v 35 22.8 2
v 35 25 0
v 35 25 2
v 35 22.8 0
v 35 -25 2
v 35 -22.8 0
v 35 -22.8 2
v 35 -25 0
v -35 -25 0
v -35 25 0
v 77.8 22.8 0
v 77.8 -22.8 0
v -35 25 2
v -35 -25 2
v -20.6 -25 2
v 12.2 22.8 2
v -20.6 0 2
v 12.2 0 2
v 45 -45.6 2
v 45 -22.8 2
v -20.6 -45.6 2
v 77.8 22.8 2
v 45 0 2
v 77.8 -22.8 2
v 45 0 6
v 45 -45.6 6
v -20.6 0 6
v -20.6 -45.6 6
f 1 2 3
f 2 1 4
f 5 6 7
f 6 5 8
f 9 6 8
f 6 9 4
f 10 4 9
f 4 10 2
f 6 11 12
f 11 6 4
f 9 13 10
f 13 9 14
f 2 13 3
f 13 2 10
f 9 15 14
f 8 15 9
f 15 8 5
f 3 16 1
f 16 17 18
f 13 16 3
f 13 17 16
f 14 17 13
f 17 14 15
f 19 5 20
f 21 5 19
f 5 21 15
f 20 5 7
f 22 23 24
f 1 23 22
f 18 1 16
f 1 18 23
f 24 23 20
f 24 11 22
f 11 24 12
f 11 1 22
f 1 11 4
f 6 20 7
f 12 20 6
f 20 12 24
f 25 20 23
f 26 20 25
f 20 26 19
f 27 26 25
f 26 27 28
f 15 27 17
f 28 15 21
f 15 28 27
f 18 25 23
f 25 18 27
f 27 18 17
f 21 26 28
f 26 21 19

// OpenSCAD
// Two-part enclosure for small electronics board
// Print orientation: both parts on the bed, lid on +X side of box

// ---- Box ----
box_x = 70;      // outer size in X
box_y = 50;      // outer size in Y
box_z = 30;      // outer size in Z
wall = 2;        // wall thickness
floor = 2;       // floor thickness

// ---- Lid ----
lip_w = 65.6;    // lip outer size in X
lip_y = 45.6;    // lip outer size in Y
lip_t = 1.5;     // lip thickness
lip_h = 4;       // lip height (wall above plate)
eps = 0.2;       // clearance between lip and box opening

// ---- Layout ----
gap = 10;        // gap between box and lid on bed
plate_t = 2;     // lid plate thickness

$fn = 64;

// Box: open-top enclosure, centred in X/Y, sitting on z = 0
module box() {
    difference() {
        translate([-box_x/2, -box_y/2, 0])
            cube([box_x, box_y, box_z]);
        // open top: cut from floor up to (box_z - wall)
        translate([-box_x/2 - eps, -box_y/2 - eps, floor])
            cube([box_x + 2*eps, box_y + 2*eps, box_z - wall]);
    }
}

// Lid: plate with rectangular lip on top, printed upside down
module lid() {
    translate([-lip_w/2, -lip_y/2, 0])
        union() {
            // base plate
            cube([lip_w, lip_y, plate_t]);
            // lip: wall extending above the plate
            translate([-lip_w/2, -lip_y/2, plate_t])
                cube([lip_w, lip_y, lip_h]);
        }
}

box();
translate([box_x/2 + gap, 0, 0])
    lid();
